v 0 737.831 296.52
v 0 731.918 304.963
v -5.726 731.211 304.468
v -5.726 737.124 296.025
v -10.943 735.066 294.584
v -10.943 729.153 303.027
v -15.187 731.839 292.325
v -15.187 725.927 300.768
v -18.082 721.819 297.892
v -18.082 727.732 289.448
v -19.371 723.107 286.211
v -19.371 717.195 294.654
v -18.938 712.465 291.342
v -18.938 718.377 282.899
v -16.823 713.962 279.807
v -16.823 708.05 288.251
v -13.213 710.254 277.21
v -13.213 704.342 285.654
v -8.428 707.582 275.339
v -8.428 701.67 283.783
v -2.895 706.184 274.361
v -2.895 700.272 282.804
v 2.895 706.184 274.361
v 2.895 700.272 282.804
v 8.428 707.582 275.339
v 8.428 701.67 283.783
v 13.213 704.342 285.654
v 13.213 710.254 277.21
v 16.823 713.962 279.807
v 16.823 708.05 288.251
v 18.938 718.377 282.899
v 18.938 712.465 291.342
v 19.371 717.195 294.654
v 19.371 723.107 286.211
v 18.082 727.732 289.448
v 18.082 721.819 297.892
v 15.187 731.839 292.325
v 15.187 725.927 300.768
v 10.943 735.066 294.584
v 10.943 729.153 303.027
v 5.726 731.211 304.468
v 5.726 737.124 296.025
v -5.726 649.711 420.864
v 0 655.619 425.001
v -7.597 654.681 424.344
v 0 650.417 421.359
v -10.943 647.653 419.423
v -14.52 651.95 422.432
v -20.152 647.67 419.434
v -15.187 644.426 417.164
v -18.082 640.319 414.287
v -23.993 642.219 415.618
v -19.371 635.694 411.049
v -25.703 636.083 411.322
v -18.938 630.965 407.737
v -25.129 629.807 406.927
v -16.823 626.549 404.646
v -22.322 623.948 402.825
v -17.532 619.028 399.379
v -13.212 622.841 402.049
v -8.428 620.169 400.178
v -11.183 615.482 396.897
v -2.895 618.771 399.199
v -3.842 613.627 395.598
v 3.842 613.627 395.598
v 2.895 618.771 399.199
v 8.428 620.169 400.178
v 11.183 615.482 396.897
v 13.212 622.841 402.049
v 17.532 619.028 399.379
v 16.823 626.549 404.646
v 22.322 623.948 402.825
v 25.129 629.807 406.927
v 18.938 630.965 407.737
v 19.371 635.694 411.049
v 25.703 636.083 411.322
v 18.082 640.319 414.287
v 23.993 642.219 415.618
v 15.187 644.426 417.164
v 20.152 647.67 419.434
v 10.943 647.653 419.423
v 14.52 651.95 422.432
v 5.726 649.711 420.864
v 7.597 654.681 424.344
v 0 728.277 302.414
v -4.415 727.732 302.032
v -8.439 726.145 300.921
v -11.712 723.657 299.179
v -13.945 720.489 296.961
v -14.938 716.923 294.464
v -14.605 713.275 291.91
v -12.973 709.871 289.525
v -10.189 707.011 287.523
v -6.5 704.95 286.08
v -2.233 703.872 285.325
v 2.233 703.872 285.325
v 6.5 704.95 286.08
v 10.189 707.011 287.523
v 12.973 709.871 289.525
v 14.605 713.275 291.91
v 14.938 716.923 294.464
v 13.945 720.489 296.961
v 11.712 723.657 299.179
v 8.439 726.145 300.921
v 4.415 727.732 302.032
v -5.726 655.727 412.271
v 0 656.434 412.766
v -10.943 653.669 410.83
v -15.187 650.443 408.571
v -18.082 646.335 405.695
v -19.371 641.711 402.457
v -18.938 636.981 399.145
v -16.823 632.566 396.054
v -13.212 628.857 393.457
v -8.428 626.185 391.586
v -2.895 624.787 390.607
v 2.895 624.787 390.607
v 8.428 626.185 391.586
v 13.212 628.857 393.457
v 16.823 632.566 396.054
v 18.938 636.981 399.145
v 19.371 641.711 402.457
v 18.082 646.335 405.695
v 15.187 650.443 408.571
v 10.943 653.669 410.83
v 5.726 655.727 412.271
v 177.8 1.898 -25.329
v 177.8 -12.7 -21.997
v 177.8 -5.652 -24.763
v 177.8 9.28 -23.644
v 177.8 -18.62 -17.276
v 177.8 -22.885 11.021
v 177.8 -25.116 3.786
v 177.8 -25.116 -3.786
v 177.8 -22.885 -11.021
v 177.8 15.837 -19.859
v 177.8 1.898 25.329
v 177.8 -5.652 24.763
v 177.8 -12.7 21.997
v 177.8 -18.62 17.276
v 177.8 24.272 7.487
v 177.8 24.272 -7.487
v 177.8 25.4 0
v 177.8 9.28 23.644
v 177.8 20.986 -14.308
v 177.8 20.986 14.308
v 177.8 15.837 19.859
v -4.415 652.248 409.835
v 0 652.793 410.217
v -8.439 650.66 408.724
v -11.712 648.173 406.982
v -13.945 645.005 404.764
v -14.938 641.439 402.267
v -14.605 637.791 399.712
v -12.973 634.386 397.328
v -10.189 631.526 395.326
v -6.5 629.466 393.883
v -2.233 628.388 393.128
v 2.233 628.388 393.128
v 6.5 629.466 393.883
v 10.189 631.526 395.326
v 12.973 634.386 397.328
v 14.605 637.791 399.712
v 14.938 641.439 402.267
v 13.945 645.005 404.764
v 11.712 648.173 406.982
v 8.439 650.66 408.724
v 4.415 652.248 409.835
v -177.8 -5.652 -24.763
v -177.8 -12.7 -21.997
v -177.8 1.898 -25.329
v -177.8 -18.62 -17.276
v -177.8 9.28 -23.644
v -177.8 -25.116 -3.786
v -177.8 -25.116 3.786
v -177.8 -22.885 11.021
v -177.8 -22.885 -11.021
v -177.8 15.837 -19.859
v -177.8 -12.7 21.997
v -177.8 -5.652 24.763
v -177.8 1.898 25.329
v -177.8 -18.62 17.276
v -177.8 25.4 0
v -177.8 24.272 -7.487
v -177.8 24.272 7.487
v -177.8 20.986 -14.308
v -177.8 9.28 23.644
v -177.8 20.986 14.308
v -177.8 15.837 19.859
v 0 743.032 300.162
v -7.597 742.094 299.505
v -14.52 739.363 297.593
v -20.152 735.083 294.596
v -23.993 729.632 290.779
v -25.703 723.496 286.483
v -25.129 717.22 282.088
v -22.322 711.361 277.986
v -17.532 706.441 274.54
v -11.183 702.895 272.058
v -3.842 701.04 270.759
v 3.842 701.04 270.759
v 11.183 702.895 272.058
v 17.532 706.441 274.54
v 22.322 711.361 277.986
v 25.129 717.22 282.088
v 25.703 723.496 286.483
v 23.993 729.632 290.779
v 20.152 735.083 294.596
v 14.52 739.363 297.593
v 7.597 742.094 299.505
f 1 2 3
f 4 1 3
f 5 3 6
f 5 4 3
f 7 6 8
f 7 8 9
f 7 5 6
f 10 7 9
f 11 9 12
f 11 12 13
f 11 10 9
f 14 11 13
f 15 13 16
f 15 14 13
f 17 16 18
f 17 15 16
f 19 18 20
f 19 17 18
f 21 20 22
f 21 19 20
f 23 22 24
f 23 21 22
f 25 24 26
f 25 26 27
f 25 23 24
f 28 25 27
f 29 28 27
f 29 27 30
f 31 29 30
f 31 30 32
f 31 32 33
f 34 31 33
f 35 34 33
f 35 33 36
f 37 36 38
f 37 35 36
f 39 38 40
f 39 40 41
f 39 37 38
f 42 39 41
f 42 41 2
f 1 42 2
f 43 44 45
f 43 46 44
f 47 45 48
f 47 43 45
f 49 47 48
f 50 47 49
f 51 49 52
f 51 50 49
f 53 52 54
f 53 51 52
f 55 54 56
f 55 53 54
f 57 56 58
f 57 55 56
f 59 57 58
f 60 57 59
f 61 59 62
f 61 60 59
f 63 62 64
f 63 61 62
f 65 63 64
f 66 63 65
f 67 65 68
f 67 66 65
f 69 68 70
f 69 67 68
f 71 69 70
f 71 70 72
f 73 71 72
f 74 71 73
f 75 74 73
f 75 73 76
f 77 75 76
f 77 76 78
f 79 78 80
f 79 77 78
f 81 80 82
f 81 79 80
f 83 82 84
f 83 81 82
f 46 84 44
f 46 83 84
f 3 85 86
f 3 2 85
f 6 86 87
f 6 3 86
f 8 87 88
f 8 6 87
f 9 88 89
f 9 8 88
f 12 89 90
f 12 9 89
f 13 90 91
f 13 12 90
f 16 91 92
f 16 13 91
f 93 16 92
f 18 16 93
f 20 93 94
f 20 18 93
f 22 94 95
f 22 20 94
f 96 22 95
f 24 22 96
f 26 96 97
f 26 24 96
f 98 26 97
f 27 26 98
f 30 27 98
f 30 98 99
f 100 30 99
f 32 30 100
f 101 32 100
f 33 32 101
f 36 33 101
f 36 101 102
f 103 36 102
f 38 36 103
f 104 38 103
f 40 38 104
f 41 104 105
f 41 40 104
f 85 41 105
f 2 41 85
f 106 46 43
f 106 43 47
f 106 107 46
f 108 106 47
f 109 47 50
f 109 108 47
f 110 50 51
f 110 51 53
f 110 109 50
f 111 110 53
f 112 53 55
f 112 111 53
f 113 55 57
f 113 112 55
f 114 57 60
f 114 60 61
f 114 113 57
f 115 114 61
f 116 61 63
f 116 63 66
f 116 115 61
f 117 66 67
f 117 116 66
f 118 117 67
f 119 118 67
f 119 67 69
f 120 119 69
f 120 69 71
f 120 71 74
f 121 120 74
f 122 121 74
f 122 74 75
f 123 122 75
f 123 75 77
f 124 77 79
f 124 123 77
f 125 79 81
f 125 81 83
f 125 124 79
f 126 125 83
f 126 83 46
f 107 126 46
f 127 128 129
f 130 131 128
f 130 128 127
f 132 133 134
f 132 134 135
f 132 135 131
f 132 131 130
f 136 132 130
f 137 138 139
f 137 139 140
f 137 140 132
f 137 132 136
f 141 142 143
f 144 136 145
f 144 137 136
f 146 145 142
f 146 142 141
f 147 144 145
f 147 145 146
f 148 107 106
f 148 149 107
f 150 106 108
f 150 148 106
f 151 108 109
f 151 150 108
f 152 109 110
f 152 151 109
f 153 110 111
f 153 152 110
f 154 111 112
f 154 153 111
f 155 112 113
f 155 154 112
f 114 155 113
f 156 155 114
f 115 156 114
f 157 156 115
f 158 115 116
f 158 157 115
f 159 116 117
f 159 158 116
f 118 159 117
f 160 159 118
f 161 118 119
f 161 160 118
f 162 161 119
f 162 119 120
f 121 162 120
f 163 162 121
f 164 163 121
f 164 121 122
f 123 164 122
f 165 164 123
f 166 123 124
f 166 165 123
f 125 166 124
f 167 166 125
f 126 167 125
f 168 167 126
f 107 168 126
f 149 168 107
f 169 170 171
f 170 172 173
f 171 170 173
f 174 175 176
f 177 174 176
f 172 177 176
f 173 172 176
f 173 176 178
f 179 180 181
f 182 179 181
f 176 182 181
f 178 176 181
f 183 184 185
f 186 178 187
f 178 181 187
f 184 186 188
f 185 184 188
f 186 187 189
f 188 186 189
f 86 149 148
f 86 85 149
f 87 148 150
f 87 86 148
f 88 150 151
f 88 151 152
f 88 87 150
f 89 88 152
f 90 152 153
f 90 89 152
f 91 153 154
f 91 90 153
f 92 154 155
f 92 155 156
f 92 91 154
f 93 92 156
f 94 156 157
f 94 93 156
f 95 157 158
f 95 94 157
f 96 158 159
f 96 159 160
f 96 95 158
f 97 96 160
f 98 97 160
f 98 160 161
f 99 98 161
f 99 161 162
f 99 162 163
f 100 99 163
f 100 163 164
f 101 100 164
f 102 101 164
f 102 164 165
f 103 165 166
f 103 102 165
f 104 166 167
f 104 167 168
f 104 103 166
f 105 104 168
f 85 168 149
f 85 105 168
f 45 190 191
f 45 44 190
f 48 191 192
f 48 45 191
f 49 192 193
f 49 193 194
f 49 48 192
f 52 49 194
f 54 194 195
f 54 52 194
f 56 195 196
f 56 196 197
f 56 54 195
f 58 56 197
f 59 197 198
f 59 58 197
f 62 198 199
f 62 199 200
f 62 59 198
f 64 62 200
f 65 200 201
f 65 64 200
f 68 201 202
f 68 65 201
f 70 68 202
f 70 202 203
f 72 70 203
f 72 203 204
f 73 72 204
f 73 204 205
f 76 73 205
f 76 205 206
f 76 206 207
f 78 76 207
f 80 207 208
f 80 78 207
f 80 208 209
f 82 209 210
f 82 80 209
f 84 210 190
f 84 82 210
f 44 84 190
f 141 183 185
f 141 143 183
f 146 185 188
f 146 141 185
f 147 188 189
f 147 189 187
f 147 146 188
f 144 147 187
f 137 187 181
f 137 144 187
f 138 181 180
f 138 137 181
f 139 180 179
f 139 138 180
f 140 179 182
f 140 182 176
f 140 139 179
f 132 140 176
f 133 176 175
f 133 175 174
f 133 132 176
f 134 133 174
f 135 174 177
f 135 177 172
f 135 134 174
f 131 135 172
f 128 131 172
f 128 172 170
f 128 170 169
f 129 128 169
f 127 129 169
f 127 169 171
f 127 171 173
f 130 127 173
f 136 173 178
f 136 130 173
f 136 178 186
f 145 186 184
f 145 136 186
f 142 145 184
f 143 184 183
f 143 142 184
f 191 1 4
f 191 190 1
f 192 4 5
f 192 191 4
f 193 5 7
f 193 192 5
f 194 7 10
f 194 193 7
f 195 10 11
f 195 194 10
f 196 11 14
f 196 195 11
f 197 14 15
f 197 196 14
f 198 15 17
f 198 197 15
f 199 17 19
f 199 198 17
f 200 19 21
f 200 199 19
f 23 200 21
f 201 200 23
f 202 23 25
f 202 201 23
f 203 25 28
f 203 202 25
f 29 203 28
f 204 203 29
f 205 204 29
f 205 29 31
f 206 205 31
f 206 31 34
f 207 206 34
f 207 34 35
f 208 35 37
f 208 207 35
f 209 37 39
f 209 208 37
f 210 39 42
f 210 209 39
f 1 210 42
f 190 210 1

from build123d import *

# Parameters (mm, degrees)
F2_DEPTH = 177.8


with BuildPart() as f1:
    # F0 (on Right) → F1 (revolve)
    with BuildSketch(Plane.YZ):
        Polygon((743.032127, 300.161978), (655.619078, 425.000749), (650.417463, 421.358539), (656.433847, 412.766252), (652.792716, 410.216705), (728.277148, 302.413763), (731.918279, 304.96331), (737.830512, 296.519767), align=None)
    revolve(axis=Axis((0, 678.211799, 347.797319), (0, -0.573576, 0.819152)))


with BuildPart() as f2:
    # F0 (on Right) → F2 (new body, symmetric)
    with BuildSketch(Plane.YZ):
        with BuildLine():
            ThreePointArc((-25.4, 0), (0, -25.4), (25.4, 0))
            Line((25.4, 0), (-25.4, 0))
        make_face()
        with BuildLine():
            Line((-25.4, 0), (25.4, 0))
            ThreePointArc((25.4, 0), (0, 25.4), (-25.4, 0))
        make_face()
    extrude(amount=F2_DEPTH, both=True)


solid = Compound([f1.part, f2.part])
